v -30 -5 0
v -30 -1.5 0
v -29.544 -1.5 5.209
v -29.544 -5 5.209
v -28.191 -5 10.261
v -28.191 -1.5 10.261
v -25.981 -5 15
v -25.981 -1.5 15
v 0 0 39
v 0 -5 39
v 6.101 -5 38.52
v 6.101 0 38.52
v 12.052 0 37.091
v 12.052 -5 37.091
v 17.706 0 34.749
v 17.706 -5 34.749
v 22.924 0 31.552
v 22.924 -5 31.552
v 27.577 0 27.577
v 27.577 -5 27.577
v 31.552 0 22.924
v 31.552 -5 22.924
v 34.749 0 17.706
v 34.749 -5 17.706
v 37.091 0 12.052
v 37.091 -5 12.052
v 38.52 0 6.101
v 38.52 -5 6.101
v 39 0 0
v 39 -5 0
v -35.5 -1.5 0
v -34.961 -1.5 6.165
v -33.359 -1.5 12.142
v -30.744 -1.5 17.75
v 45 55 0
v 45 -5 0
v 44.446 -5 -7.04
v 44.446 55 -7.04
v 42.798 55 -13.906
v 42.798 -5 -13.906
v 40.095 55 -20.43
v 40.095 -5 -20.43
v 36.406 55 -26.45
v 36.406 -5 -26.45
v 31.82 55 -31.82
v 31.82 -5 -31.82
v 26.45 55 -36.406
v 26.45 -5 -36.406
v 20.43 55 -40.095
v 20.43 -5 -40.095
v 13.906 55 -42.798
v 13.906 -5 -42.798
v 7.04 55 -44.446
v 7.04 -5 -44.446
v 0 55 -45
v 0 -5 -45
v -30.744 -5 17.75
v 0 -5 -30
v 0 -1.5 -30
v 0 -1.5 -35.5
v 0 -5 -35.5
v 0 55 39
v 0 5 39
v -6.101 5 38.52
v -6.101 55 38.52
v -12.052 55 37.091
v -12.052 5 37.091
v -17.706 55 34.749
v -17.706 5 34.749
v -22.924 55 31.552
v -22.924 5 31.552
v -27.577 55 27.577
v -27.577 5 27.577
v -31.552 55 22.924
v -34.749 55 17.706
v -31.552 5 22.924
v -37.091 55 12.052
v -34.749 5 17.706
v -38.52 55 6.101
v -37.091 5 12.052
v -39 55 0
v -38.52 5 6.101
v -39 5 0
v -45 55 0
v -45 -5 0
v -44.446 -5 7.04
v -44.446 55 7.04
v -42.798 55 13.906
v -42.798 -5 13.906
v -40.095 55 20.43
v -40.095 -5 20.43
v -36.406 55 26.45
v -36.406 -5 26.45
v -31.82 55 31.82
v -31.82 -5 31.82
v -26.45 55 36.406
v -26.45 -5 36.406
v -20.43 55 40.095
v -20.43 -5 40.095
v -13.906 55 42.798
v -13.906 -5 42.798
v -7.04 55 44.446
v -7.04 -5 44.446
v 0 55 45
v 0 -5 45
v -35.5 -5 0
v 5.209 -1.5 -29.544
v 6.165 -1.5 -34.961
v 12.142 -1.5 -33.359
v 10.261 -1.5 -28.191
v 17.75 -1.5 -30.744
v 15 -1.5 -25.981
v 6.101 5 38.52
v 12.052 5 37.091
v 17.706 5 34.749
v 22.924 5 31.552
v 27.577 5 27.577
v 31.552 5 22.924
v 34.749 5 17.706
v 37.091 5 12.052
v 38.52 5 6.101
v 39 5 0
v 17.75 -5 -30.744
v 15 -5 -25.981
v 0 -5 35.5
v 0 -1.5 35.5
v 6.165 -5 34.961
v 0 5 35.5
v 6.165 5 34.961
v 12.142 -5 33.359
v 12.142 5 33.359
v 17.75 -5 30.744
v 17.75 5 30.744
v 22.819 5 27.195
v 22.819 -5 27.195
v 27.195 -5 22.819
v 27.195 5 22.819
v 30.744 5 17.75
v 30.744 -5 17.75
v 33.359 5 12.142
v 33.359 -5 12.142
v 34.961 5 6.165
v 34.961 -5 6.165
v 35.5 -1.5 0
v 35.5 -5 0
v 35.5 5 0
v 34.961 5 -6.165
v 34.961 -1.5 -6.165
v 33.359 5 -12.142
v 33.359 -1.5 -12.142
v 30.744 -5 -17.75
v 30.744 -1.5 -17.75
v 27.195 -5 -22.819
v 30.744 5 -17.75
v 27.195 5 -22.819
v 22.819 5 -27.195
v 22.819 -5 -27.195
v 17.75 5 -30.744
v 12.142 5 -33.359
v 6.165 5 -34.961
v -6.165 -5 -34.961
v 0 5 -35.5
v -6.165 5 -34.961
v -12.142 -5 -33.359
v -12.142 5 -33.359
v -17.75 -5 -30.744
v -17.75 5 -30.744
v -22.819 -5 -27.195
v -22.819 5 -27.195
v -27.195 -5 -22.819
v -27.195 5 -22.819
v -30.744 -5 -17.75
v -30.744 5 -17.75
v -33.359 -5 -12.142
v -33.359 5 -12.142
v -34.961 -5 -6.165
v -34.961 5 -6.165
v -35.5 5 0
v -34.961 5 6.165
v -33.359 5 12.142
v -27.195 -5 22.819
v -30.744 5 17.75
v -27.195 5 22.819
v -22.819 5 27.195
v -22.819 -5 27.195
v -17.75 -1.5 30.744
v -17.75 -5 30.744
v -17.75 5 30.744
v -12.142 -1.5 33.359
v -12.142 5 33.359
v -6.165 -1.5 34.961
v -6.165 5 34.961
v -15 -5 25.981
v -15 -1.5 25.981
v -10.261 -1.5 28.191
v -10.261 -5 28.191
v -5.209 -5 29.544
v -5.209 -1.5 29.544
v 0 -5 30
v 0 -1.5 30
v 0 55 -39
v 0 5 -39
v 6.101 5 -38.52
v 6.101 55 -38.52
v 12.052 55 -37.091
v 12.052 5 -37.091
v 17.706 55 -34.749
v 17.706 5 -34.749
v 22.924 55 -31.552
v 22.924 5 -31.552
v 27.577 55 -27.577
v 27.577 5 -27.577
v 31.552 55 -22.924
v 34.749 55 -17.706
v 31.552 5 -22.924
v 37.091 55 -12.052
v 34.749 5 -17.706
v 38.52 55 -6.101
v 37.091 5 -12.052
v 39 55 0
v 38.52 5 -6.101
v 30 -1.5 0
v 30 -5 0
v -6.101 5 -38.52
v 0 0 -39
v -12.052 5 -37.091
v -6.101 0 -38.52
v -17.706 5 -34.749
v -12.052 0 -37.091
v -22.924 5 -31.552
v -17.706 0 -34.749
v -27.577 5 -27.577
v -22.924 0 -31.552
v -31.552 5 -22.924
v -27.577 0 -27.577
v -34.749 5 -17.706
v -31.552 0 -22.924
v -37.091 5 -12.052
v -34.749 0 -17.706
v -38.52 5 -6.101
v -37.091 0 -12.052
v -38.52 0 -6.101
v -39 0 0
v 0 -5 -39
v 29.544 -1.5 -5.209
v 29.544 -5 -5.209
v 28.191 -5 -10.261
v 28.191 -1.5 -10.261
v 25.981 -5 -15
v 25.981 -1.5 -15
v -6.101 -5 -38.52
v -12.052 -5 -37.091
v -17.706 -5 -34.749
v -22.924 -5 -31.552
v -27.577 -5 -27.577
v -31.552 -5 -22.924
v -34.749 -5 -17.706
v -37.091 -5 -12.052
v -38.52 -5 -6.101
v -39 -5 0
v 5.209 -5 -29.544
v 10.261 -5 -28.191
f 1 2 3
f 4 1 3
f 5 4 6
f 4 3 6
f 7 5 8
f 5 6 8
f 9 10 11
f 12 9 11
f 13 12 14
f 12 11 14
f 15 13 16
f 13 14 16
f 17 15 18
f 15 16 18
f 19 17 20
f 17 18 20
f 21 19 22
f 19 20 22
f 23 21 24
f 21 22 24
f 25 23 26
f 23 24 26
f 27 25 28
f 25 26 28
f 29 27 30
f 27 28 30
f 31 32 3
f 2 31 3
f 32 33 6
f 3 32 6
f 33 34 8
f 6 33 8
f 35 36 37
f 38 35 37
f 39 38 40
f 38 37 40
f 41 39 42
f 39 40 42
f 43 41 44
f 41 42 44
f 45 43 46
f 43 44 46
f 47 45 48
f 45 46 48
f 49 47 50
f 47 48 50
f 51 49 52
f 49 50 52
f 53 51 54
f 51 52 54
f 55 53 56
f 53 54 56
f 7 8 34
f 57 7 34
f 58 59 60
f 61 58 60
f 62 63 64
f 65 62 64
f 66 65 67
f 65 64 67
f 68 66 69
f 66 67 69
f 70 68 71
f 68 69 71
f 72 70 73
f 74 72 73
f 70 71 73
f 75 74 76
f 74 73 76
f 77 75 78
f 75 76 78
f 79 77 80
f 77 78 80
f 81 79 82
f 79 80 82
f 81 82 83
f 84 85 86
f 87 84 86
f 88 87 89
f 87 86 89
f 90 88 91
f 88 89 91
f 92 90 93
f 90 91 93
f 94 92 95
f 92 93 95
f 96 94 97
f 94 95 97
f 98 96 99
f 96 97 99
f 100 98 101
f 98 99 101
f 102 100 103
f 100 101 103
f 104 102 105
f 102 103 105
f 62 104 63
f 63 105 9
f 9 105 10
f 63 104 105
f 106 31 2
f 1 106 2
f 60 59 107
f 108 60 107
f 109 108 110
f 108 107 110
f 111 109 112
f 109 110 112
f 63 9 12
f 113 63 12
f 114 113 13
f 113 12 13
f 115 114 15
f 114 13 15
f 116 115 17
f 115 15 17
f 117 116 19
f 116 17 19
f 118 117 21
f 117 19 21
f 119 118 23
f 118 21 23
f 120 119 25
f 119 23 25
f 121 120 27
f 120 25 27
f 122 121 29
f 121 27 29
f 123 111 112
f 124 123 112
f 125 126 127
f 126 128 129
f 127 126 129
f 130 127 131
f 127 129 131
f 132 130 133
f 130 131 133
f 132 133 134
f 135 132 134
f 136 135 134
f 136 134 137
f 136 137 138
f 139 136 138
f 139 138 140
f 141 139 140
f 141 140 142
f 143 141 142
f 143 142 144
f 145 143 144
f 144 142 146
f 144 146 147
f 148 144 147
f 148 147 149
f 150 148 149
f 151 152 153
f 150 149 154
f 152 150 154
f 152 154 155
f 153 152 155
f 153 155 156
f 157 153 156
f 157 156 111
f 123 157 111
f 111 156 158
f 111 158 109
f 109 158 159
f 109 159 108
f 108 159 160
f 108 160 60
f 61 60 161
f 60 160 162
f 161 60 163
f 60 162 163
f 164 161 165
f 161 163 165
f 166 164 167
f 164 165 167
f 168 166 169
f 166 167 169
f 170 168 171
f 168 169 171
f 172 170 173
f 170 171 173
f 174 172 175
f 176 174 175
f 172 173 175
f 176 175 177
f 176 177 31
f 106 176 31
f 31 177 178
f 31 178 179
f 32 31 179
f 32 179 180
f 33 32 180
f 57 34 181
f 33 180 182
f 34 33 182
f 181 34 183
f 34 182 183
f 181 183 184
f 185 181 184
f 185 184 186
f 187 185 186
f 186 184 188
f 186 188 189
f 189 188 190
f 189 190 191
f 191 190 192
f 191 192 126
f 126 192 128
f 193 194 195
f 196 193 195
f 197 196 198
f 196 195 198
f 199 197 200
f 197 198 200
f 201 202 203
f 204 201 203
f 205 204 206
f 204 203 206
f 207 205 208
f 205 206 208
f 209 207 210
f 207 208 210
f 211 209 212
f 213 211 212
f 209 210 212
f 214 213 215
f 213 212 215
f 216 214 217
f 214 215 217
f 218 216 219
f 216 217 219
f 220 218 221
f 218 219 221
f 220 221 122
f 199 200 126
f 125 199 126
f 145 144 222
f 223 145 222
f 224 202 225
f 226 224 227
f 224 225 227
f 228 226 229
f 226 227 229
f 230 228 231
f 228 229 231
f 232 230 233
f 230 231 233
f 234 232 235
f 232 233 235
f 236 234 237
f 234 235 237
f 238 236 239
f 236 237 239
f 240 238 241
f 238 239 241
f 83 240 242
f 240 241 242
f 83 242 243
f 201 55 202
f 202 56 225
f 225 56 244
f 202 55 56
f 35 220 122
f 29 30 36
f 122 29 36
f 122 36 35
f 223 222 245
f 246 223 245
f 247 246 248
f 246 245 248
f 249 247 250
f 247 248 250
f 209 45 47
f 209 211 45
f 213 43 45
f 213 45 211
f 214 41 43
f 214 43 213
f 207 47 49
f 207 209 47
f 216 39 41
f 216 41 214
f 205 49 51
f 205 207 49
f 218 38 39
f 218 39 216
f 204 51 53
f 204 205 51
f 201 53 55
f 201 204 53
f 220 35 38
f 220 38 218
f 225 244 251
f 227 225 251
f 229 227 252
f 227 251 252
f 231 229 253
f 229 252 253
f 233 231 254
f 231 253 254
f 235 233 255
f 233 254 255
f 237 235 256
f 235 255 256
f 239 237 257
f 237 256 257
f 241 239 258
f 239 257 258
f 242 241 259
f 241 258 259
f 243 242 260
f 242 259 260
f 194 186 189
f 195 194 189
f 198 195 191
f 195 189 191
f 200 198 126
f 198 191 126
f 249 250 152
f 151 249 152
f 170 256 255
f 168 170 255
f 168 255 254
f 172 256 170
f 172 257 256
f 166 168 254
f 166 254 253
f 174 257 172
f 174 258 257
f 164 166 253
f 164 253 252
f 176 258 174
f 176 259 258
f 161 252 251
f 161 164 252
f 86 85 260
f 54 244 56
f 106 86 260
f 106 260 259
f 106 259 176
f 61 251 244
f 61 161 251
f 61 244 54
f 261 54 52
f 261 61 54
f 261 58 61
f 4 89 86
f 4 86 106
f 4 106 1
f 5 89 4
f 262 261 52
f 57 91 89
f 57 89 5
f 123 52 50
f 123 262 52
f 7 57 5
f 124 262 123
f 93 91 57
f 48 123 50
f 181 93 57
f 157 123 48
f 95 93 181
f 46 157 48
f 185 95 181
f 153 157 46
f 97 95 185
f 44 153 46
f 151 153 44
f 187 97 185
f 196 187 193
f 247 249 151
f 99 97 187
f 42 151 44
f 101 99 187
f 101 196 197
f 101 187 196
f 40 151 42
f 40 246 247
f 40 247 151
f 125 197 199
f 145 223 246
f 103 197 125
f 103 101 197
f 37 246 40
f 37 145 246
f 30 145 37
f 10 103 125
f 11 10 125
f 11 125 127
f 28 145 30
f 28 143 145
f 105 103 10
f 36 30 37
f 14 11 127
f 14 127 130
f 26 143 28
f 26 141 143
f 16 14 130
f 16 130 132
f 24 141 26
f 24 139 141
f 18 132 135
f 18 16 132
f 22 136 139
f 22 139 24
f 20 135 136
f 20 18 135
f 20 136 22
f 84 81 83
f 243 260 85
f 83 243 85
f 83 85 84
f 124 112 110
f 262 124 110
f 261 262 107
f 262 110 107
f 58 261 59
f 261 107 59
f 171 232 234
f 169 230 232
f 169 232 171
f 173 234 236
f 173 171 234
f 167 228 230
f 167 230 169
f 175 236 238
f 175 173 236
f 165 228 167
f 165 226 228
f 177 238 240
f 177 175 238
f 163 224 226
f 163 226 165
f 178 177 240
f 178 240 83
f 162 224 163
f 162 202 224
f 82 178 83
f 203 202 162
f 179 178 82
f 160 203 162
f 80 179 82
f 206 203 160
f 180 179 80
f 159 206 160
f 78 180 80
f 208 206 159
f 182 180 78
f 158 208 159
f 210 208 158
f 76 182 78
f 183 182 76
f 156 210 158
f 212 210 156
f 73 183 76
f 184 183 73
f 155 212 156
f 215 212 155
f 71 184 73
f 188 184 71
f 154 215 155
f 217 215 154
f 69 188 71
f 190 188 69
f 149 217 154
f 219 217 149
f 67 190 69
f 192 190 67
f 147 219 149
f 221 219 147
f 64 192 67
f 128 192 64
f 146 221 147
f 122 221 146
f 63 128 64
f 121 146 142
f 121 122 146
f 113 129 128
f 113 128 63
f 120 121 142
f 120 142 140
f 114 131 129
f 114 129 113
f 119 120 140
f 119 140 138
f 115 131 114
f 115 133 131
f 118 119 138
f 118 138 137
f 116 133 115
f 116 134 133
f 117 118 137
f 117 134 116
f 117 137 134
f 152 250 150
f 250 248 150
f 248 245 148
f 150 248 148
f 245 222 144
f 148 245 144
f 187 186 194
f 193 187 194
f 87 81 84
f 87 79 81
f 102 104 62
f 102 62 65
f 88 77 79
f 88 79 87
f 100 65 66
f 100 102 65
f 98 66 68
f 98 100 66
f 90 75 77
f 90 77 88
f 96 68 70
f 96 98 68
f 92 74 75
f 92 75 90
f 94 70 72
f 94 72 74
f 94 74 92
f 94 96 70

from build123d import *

# Parameters (mm, degrees)
ESBO_O1_R            = 39
EXTRUS_O1_DEPTH      = 5
EXTRUS_O2_DEPTH      = 50
EXTRUS_O2_DEPTH_BACK = 5
EXTRUS_O11_START     = 5
EXTRUS_O11_DEPTH     = 5
ESBO_O7_R            = 35.5
EXTRUS_O12_DEPTH     = 10
EXTRUS_O13_START     = -3.5
EXTRUS_O13_DEPTH     = 3.5


with BuildPart() as part:
    # Esboço1 → Extrusão1 (new body)
    with BuildSketch(Plane(origin=(0, 0, 0), x_dir=(1, 0, 0), z_dir=(0, 1, 0))):
        with Locations(Location((0, 0, 0), (0, 0, 270))):
            Circle(ESBO_O1_R)
    extrude(amount=EXTRUS_O1_DEPTH)

    # Esboço3 → Extrusão2 (add, two sides: drawn at the far end of the back side and taken through both)
    with BuildSketch(Plane(origin=(0, 5, 0), x_dir=(-1, 0, 0), z_dir=(0, 1, 0)).offset(-EXTRUS_O2_DEPTH_BACK)):
        with BuildLine():
            Line((39, 0), (45, 0))
            ThreePointArc((45, 0), (31.819805153, 31.819805153), (0, 45))
            Line((0, 45), (0, 39))
            ThreePointArc((0, 39), (27.577164466, 27.577164466), (39, 0))
        make_face()
        with BuildLine():
            Line((0, -45), (0, -39))
            ThreePointArc((0, -39), (-27.577164466, -27.577164466), (-39, 0))
            Line((-39, 0), (-45, 0))
            ThreePointArc((-45, 0), (-31.819805153, -31.819805153), (0, -45))
        make_face()
    extrude(amount=EXTRUS_O2_DEPTH + EXTRUS_O2_DEPTH_BACK)

    # Esboço5 → Extrusão11 (add)
    with BuildSketch(Plane.XZ.offset(EXTRUS_O11_START)):
        with BuildLine():
            Line((0, 45), (0, 39))
            ThreePointArc((0, 39), (27.577164466, 27.577164466), (39, 0))
            Line((39, 0), (45, 0))
            ThreePointArc((45, 0), (31.819805153, -31.819805153), (0, -45))
            Line((0, -45), (0, -39))
            ThreePointArc((0, -39), (-27.577164466, -27.577164466), (-39, 0))
            Line((-39, 0), (-45, 0))
            ThreePointArc((-45, 0), (-31.819805153, 31.819805153), (0, 45))
        make_face()
    extrude(amount=-EXTRUS_O11_DEPTH)

    # Esboço7 → Extrusão12 (cut)
    with BuildSketch(Plane(origin=(0, 5, 0), x_dir=(1, 0, 0), z_dir=(0, 1, 0))):
        with Locations(Location((0, 0, 0), (0, 0, 270))):
            Circle(ESBO_O7_R)
    extrude(amount=-EXTRUS_O12_DEPTH, mode=Mode.SUBTRACT)

    # Esboço8 → Extrusão13 (add)
    with BuildSketch(Plane.XZ.offset(5).offset(EXTRUS_O13_START)):
        with BuildLine():
            ThreePointArc((0, 35.5), (-9.188076101, 34.290366833), (-17.75, 30.743901834))
            Line((-17.75, 30.743901834), (-15, 25.980762114))
            ThreePointArc((-15, 25.980762114), (-7.764571353, 28.977774789), (0, 30))
            Line((0, 30), (0, 35.5))
        make_face()
        with BuildLine():
            ThreePointArc((-30.743901834, 17.75), (-34.290366833, 9.188076101), (-35.5, 0))
            Line((-35.5, 0), (-30, 0))
            ThreePointArc((-30, 0), (-28.977774789, 7.764571353), (-25.980762114, 15))
            Line((-25.980762114, 15), (-30.743901834, 17.75))
        make_face()
        with BuildLine():
            Line((0, -30), (0, -35.5))
            ThreePointArc((0, -35.5), (9.188076101, -34.290366833), (17.75, -30.743901834))
            Line((17.75, -30.743901834), (15, -25.980762114))
            ThreePointArc((15, -25.980762114), (7.764571353, -28.977774789), (0, -30))
        make_face()
        with BuildLine():
            Line((25.980762114, -15), (30.743901834, -17.75))
            ThreePointArc((30.743901834, -17.75), (34.290366833, -9.188076101), (35.5, 0))
            Line((35.5, 0), (30, 0))
            ThreePointArc((30, 0), (28.977774789, -7.764571353), (25.980762114, -15))
        make_face()
    extrude(amount=EXTRUS_O13_DEPTH)


solid = part.part
